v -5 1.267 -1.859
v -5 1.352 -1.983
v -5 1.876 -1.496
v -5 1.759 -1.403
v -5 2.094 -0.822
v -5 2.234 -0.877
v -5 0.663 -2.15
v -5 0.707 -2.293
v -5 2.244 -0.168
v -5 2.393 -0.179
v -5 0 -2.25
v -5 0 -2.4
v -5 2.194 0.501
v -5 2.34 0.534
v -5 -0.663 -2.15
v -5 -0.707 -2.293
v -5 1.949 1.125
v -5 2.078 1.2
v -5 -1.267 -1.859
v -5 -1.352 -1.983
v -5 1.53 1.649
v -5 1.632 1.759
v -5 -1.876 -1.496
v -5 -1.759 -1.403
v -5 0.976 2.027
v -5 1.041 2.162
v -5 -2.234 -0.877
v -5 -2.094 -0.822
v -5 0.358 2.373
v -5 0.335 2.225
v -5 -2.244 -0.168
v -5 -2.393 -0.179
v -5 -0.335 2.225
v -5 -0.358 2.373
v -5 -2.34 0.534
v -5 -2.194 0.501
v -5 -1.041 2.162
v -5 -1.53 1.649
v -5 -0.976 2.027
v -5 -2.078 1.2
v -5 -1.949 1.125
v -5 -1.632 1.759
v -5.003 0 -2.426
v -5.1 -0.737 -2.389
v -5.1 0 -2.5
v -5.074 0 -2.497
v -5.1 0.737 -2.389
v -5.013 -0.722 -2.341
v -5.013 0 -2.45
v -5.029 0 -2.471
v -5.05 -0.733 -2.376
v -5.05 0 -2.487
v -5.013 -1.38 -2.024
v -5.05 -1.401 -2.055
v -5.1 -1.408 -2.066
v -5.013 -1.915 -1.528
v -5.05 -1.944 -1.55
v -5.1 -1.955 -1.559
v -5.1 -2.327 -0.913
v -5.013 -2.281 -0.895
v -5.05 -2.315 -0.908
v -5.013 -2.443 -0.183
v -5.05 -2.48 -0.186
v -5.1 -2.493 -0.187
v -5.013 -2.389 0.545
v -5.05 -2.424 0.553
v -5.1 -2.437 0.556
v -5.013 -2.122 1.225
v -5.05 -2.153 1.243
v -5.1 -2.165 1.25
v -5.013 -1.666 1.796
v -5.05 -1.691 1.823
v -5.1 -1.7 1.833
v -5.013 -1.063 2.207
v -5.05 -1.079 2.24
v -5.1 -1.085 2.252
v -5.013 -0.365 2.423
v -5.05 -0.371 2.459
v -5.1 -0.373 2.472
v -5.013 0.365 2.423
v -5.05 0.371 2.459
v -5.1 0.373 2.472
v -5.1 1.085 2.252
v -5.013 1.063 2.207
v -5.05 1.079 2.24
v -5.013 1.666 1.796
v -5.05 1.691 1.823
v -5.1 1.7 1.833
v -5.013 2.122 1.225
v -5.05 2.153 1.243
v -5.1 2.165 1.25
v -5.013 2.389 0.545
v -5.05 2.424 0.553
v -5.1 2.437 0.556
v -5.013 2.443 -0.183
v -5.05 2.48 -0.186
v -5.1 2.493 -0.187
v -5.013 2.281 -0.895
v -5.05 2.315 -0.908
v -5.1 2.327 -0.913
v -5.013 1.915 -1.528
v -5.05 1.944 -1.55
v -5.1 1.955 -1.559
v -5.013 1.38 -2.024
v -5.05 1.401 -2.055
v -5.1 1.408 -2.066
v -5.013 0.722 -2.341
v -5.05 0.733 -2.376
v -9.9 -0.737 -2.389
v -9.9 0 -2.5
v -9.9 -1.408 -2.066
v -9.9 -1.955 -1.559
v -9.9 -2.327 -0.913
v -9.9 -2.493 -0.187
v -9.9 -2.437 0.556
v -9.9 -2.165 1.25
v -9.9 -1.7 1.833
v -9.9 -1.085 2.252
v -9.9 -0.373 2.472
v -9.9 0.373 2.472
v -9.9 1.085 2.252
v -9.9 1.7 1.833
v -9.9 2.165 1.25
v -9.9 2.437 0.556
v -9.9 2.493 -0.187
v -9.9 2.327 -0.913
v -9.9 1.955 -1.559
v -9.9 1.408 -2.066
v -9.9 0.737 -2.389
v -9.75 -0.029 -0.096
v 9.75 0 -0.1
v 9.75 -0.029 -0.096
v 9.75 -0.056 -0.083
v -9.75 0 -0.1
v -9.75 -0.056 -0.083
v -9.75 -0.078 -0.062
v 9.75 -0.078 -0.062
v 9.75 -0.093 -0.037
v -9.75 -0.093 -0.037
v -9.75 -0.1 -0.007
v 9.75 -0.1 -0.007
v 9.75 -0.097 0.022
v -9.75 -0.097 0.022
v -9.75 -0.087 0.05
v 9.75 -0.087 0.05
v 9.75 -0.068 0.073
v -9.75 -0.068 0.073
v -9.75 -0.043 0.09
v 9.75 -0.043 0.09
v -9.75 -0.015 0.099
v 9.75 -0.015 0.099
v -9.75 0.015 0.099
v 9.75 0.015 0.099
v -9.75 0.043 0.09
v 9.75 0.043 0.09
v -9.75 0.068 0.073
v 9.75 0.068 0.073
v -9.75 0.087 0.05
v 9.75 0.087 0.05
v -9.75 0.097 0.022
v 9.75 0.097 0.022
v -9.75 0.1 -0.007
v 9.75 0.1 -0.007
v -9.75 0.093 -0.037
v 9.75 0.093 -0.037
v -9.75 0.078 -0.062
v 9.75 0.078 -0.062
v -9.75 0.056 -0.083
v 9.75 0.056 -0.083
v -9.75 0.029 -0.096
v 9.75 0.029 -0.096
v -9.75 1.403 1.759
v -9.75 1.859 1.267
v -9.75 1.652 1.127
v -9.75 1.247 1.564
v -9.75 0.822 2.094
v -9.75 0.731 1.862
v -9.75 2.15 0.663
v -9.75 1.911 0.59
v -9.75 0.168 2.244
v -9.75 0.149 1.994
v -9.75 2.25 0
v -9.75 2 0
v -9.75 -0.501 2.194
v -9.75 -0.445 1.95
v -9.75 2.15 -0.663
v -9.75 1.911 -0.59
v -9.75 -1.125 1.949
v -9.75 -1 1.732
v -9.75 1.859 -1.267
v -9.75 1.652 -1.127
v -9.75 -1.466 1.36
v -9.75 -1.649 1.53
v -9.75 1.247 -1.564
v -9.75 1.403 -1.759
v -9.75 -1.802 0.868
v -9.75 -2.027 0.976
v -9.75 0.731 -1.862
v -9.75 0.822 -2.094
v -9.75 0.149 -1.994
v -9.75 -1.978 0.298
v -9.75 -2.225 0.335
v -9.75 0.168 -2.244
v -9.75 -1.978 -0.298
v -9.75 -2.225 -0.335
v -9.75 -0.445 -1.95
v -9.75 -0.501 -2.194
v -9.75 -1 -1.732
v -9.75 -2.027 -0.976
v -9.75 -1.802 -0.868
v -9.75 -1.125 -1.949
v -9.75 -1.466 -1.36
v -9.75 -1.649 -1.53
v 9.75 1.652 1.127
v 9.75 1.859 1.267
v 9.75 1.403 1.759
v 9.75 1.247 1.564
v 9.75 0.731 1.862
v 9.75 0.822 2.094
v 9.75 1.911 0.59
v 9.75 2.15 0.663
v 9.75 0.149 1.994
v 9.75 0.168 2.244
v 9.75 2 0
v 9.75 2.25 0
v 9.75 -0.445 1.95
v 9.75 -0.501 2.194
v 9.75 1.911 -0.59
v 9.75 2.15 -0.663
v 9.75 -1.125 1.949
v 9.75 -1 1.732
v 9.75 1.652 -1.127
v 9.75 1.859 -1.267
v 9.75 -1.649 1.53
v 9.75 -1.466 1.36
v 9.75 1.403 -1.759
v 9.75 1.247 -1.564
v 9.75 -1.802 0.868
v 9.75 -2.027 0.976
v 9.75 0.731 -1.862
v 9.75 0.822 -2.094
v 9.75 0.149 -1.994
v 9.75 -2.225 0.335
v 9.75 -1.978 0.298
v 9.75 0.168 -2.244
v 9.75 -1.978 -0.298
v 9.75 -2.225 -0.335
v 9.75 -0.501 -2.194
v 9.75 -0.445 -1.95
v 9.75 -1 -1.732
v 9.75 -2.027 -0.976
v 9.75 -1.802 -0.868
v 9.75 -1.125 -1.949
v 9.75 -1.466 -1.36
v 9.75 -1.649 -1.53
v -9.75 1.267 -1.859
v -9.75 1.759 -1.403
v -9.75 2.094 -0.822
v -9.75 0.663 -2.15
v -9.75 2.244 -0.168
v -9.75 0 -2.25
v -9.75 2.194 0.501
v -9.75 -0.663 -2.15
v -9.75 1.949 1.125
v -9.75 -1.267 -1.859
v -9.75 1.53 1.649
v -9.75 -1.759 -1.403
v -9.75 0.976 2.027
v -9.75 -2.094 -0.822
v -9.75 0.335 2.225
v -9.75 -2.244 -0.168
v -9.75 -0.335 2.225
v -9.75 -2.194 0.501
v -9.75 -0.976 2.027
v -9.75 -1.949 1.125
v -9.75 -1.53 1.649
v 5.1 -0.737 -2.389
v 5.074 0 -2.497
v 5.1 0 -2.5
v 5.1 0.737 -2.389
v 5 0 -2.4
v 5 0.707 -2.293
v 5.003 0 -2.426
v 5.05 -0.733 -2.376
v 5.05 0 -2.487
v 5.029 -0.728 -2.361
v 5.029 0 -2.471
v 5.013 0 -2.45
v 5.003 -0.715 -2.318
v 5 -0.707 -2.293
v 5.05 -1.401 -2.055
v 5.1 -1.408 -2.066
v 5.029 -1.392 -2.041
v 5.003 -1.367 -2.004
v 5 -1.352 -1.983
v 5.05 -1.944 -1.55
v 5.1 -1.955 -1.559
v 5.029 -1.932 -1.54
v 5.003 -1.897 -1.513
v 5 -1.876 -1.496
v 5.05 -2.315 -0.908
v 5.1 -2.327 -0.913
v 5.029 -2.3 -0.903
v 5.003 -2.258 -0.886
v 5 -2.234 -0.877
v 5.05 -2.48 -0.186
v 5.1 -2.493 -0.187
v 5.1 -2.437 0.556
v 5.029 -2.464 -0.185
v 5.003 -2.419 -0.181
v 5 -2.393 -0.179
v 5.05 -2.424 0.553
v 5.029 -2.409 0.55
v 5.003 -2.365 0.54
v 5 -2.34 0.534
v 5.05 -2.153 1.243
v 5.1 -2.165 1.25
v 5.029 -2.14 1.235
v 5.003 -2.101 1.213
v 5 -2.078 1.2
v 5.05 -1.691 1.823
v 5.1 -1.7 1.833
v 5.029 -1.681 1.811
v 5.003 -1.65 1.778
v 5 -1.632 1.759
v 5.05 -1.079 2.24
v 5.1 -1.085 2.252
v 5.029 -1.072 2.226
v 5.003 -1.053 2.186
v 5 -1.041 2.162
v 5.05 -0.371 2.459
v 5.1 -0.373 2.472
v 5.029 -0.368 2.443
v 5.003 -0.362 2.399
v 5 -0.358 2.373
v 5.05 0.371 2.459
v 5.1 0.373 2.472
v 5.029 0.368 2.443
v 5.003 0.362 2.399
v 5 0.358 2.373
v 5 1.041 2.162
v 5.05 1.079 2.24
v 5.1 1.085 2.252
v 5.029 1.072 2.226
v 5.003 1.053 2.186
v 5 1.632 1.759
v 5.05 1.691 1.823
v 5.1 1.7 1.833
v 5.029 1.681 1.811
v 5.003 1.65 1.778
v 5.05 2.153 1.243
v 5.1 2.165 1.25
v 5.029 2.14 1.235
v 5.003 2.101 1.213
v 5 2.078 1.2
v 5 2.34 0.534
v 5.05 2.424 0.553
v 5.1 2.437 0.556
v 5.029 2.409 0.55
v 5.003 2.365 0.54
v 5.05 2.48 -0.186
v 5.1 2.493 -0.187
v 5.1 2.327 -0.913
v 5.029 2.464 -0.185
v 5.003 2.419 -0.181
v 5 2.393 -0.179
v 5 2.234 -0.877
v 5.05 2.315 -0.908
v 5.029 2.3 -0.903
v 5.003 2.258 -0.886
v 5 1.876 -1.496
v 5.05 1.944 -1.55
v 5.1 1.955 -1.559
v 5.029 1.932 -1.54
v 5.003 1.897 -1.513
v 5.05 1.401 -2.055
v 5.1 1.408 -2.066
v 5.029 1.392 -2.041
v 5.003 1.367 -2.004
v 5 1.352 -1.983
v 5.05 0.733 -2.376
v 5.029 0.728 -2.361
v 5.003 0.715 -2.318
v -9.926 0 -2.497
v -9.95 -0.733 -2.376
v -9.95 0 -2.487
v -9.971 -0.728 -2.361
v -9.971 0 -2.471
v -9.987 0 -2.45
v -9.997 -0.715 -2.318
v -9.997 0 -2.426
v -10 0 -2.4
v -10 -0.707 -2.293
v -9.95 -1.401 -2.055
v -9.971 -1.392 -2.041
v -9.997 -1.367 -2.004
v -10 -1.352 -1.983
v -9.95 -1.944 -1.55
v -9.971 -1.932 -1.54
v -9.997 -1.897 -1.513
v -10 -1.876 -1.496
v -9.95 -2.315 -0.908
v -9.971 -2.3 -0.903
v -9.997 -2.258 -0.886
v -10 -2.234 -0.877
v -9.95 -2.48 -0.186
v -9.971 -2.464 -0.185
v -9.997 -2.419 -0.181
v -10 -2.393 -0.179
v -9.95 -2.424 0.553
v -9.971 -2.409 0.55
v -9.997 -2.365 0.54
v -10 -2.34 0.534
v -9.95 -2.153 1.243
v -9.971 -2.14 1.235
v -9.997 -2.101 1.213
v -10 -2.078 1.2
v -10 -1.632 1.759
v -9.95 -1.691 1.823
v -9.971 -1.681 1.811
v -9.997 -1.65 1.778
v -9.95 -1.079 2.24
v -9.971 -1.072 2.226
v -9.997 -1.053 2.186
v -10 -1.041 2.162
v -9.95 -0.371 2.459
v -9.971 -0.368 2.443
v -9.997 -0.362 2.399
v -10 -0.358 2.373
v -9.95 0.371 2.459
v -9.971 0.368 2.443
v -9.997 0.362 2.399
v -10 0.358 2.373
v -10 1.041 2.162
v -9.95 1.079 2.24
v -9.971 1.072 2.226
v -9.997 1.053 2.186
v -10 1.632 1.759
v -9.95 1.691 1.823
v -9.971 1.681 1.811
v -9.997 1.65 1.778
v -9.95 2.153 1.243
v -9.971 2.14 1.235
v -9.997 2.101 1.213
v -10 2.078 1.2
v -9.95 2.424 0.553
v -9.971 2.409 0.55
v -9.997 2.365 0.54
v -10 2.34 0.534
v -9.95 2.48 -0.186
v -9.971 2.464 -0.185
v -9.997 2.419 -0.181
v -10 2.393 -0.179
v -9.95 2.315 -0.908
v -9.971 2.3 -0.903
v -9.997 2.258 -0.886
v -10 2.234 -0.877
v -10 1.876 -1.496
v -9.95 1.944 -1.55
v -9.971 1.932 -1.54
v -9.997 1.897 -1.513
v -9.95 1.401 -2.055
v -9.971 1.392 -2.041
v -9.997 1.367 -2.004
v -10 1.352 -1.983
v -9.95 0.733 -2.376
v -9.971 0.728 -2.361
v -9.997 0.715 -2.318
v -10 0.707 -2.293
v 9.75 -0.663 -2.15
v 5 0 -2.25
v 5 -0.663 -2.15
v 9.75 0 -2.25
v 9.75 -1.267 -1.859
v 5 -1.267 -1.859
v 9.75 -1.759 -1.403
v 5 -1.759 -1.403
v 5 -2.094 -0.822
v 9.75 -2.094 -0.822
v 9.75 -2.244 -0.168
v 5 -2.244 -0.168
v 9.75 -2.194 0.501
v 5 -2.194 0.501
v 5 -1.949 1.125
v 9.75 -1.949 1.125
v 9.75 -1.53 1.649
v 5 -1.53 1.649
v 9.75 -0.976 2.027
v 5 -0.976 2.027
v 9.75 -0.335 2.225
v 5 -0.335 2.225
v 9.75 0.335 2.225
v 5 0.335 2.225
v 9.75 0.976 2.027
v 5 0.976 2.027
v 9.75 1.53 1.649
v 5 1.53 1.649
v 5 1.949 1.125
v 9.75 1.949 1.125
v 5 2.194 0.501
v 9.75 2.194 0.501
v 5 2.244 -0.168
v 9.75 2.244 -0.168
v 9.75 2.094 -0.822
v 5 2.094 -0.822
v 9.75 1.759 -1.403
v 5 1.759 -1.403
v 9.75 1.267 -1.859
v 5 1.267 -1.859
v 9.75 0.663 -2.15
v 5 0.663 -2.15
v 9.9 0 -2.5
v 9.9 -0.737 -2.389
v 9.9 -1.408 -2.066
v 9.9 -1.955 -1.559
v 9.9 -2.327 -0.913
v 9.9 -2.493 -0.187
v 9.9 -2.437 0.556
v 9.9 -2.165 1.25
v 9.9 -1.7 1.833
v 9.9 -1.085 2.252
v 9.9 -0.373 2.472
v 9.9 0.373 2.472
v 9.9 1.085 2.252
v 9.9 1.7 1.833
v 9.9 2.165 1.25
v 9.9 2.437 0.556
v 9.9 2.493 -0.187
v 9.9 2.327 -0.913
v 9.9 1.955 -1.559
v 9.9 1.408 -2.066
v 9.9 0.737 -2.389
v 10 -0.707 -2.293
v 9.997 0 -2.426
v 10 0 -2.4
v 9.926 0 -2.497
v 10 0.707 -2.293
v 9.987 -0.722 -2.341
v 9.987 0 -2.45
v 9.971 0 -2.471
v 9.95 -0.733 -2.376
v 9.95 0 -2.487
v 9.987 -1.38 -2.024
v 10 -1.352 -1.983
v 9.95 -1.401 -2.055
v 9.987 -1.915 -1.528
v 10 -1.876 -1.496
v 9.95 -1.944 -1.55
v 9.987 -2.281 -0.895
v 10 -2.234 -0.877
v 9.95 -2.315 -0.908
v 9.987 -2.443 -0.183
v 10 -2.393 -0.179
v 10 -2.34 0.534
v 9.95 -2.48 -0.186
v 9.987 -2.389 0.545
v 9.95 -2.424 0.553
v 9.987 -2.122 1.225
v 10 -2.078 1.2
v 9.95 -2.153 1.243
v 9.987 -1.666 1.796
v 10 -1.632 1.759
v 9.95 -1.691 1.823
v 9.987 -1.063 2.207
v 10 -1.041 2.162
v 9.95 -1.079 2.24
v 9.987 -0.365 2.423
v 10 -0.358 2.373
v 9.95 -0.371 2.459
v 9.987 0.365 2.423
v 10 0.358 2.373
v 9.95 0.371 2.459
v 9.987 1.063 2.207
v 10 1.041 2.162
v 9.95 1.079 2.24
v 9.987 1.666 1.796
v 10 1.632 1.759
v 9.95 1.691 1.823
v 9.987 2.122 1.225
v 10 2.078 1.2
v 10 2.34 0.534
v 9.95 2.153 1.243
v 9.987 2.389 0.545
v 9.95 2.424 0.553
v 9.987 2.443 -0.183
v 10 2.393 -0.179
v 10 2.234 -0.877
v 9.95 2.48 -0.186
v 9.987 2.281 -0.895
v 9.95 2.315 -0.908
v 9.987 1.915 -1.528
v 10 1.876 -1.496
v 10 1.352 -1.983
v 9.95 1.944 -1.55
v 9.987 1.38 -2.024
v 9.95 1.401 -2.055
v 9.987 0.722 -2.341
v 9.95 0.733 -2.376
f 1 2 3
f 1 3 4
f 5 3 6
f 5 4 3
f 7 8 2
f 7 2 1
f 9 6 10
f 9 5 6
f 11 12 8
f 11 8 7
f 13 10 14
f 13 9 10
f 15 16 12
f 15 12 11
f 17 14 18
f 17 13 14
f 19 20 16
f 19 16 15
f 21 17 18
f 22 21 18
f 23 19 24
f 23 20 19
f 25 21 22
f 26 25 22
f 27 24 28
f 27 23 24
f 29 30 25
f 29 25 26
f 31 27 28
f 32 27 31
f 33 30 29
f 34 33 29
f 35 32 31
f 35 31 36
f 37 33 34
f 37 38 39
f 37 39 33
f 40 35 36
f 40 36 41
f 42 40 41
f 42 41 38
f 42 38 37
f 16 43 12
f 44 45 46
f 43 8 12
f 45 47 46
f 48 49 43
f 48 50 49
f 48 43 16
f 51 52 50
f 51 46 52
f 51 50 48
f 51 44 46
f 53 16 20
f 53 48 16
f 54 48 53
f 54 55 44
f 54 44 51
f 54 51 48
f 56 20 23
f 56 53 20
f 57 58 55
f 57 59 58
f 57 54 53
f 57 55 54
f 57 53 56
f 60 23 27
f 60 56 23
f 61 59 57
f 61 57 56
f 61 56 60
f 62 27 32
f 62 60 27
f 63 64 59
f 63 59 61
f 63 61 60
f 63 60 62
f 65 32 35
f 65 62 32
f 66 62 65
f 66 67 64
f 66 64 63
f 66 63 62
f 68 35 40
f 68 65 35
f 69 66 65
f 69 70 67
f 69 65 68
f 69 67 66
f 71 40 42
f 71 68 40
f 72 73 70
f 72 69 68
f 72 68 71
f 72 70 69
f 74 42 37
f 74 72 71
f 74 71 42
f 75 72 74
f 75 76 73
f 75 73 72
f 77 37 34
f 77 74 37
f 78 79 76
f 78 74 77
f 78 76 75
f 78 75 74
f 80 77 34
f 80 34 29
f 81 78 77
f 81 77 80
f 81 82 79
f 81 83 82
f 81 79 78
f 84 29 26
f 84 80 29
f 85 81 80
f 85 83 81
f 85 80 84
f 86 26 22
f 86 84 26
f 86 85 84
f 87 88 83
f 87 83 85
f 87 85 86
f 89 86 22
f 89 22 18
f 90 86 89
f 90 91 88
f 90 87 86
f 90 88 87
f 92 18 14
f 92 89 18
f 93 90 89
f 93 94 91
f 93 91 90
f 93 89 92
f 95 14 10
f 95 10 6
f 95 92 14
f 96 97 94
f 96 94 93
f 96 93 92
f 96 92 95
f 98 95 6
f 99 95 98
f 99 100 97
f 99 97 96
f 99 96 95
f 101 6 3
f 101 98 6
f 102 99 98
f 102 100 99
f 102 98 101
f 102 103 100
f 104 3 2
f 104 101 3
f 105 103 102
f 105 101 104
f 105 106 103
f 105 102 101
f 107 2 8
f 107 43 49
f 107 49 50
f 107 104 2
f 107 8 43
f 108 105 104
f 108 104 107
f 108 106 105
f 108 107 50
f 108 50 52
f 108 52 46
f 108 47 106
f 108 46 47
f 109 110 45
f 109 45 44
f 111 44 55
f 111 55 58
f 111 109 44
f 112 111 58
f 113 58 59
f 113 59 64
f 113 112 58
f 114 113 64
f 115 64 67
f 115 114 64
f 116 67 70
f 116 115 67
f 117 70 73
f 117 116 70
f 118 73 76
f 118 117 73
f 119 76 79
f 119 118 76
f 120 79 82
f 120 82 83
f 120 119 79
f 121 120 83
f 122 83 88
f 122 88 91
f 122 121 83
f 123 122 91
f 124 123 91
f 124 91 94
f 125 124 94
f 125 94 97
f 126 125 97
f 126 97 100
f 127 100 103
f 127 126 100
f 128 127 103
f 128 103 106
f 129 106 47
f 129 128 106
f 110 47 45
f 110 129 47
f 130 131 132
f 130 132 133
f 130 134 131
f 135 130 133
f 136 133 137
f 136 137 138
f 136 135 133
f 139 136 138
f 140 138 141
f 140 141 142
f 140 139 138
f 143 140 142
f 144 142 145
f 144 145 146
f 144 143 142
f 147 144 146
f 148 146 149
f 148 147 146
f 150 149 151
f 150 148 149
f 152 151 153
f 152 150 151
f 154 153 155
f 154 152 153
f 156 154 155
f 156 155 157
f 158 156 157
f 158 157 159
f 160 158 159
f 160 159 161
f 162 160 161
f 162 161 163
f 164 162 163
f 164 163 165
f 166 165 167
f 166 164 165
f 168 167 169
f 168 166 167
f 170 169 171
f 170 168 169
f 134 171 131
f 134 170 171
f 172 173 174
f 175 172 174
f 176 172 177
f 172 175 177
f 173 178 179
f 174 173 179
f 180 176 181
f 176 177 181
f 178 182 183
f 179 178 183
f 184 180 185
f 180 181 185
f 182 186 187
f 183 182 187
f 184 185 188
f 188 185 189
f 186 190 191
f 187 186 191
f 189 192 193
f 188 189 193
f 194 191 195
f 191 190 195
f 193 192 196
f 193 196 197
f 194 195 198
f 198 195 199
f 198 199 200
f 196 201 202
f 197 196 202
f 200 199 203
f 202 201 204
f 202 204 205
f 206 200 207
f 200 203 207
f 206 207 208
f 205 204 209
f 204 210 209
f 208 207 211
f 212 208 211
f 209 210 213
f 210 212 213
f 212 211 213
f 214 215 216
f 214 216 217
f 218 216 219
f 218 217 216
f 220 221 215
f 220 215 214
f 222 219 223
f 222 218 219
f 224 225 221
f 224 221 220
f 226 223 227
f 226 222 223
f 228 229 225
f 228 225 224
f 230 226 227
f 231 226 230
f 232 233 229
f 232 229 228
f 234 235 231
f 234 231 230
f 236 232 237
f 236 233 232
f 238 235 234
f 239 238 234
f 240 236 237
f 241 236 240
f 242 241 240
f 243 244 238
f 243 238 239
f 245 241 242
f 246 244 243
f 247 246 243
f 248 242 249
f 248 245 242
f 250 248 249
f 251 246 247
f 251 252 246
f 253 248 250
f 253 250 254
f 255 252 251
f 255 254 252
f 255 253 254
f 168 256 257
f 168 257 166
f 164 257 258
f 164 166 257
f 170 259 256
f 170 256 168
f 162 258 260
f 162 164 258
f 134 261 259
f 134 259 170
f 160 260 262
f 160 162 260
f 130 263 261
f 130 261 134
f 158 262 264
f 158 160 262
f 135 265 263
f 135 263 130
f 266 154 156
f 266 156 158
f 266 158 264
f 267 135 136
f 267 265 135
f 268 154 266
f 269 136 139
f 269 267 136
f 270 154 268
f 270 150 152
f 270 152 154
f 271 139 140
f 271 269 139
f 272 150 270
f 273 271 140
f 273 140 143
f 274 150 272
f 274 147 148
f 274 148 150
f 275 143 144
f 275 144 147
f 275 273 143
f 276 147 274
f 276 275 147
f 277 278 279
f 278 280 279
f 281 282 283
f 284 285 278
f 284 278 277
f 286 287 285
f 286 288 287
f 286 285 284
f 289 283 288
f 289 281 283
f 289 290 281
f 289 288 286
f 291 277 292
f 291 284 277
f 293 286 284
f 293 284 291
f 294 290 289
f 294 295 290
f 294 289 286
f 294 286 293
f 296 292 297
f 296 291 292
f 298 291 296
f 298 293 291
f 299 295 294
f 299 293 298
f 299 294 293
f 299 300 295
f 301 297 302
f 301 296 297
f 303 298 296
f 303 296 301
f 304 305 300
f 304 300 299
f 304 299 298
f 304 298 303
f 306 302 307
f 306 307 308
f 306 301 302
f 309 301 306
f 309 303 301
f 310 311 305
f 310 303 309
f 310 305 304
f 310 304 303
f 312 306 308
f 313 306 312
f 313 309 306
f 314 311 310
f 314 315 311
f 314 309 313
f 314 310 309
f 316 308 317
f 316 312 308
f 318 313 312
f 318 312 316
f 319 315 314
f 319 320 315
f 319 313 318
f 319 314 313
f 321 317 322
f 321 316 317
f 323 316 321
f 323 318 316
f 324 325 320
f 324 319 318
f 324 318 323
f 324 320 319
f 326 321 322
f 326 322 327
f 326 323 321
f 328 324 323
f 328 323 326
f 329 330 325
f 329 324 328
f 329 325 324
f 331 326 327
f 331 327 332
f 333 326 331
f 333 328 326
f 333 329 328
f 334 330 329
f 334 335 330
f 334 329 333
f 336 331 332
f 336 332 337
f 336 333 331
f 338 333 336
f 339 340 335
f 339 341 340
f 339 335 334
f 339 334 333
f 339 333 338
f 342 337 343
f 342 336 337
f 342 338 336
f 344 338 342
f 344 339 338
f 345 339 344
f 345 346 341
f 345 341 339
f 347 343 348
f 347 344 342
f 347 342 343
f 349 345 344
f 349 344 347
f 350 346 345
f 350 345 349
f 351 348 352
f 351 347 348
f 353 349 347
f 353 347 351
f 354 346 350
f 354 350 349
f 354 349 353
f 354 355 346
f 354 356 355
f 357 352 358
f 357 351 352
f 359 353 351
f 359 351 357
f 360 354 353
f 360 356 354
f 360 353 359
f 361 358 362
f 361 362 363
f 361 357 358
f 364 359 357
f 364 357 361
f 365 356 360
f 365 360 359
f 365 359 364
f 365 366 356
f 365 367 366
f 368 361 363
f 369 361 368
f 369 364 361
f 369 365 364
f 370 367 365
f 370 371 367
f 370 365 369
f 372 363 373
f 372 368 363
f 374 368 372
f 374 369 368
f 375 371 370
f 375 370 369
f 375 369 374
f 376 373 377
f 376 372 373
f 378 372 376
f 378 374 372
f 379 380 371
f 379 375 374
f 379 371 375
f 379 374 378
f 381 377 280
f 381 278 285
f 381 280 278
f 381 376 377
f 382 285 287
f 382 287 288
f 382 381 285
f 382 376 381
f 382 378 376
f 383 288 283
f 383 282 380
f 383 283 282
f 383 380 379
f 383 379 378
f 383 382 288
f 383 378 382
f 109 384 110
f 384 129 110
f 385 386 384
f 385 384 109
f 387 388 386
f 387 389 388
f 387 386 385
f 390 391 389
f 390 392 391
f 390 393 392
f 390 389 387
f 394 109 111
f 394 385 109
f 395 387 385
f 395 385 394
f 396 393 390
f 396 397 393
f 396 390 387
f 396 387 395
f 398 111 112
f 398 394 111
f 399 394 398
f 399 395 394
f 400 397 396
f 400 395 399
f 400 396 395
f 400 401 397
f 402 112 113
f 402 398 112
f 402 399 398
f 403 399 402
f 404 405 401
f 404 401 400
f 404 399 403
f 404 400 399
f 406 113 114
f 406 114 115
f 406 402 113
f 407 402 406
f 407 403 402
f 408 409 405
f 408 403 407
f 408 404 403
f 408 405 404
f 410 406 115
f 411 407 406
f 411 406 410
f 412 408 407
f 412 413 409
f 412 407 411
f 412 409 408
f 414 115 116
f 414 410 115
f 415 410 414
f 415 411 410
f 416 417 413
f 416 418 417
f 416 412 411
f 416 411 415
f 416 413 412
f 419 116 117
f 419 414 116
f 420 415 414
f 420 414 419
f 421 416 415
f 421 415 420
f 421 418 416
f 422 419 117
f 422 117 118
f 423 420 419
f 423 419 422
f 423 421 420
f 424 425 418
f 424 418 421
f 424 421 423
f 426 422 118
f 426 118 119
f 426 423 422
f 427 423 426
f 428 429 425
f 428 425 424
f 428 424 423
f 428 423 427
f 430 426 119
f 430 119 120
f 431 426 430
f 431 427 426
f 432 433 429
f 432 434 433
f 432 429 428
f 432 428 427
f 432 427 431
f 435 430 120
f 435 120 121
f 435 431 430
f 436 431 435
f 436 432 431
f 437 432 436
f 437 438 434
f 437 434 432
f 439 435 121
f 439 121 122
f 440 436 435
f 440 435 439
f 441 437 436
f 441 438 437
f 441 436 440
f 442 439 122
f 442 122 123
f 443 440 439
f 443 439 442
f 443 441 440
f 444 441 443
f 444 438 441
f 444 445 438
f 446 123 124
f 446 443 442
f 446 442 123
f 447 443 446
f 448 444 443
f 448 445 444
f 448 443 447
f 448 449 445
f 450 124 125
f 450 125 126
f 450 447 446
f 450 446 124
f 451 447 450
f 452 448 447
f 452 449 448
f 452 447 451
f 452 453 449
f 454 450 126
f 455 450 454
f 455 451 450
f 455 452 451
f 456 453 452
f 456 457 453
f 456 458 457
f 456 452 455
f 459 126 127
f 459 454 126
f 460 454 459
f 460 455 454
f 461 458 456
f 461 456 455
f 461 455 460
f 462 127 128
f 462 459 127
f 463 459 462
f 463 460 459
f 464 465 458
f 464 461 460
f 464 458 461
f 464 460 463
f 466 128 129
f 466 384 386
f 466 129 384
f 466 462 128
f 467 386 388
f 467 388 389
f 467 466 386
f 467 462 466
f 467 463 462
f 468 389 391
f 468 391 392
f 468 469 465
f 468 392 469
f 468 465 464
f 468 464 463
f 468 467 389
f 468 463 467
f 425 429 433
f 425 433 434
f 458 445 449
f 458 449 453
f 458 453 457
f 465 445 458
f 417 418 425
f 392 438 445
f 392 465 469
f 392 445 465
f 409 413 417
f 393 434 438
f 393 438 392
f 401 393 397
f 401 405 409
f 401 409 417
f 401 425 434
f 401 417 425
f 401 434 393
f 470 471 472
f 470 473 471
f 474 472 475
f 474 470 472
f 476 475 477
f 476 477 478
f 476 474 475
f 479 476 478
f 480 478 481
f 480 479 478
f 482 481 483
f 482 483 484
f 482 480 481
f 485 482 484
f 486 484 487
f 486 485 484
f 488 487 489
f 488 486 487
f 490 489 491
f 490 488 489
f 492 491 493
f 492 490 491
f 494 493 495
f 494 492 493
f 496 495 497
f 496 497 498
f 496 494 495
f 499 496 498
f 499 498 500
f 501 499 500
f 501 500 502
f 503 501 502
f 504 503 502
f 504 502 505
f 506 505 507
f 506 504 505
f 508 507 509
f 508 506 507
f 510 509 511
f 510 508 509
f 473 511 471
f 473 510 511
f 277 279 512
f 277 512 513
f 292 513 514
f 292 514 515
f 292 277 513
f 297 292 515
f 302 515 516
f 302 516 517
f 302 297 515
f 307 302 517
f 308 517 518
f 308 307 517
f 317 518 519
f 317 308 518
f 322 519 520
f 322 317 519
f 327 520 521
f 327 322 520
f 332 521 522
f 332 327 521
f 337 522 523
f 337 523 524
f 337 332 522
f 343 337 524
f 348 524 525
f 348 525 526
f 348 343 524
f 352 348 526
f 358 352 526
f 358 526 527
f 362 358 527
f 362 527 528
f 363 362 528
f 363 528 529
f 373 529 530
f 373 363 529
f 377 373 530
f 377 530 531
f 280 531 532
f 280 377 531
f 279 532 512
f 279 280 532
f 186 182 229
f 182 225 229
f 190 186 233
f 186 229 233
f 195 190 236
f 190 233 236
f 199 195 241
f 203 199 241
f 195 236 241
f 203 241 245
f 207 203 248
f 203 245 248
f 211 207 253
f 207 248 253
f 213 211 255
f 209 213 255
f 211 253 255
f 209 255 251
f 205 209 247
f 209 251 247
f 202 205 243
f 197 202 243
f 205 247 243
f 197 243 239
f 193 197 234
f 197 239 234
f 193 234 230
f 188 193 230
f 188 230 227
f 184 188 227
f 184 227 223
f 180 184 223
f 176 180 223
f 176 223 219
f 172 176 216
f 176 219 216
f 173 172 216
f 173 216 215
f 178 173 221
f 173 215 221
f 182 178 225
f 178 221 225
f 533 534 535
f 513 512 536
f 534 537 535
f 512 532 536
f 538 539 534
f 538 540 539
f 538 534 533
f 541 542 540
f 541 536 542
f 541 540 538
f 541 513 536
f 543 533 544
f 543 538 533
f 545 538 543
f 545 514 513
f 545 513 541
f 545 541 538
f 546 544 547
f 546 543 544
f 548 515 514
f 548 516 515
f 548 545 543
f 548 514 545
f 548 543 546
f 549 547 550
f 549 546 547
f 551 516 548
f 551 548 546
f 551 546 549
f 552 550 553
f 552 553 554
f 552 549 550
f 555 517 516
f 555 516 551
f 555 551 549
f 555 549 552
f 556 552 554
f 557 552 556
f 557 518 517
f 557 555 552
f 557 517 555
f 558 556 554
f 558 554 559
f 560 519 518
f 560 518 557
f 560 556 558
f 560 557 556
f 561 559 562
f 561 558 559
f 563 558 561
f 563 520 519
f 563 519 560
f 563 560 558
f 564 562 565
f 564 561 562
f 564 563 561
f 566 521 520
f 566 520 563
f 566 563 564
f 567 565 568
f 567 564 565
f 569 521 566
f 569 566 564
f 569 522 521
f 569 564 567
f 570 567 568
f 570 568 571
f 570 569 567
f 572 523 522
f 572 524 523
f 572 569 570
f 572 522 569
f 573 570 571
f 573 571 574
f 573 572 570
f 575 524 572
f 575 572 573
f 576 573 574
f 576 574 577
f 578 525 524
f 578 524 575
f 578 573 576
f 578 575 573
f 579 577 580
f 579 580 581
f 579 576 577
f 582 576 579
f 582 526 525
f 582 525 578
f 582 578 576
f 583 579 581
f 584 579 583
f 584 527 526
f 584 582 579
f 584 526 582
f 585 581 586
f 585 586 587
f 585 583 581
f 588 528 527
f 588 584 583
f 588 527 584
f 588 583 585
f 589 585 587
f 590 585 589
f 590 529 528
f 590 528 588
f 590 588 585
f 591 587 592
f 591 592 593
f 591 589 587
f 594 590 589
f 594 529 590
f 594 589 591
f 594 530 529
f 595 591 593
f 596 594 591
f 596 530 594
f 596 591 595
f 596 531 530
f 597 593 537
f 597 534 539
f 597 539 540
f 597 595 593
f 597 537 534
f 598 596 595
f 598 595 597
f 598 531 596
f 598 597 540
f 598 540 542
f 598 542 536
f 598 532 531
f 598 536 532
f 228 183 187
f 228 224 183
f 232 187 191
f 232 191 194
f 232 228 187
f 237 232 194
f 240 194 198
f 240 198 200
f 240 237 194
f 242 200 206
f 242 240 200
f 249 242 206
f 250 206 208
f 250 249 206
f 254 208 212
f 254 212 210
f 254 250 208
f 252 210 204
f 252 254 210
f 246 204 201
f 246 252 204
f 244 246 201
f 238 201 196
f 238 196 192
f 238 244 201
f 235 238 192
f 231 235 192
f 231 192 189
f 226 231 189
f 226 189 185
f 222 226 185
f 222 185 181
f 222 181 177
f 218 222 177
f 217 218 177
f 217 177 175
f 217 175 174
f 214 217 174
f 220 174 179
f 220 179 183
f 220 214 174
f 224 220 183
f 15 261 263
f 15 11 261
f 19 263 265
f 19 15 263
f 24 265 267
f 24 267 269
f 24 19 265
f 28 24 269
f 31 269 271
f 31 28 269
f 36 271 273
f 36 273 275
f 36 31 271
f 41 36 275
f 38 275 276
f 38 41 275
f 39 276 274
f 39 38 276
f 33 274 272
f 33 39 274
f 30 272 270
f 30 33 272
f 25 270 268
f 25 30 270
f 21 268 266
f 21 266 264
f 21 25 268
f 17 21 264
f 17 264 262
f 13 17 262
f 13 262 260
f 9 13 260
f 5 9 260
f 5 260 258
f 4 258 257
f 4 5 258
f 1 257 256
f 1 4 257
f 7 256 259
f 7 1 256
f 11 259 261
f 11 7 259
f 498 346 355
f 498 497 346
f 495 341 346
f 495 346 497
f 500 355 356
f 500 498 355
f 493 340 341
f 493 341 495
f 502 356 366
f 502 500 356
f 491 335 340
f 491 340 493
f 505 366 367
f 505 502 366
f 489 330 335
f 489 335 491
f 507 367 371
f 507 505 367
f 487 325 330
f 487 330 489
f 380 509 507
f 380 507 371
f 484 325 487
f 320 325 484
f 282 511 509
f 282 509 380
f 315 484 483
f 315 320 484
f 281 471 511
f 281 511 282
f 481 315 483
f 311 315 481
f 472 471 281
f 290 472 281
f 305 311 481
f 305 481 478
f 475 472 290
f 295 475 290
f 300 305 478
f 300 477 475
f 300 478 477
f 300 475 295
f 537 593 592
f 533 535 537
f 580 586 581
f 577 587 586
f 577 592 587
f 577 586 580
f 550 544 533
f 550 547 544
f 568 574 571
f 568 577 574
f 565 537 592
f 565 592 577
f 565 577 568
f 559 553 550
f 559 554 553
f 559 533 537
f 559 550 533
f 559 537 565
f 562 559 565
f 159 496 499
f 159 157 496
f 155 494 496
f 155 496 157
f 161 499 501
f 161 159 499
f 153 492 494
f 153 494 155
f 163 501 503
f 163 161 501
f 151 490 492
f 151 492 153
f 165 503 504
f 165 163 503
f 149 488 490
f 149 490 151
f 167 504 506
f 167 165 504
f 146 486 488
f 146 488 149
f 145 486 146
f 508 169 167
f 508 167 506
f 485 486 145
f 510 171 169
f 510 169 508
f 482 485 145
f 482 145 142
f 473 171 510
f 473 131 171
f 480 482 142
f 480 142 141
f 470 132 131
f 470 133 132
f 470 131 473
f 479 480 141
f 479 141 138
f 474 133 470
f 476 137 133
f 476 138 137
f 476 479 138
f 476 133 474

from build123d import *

# Parameters (mm, degrees)
SCHIZZO4_W  = 19.5
SCHIZZO4_H  = 0.25
RACCORDO1_R = 0.1


with BuildPart() as part:
    # Schizzo4 → Rivoluzione3 (revolve)
    with BuildSketch(Plane.XY):
        with Locations((0, 2.125)):
            Rectangle(SCHIZZO4_W, SCHIZZO4_H)
    revolve(axis=Axis((0, 0, 0), (-1, 0, 0)))


with BuildPart() as body_2:
    # Schizzo6 → Rivoluzione4 (revolve)
    with BuildSketch(Plane.XY, mode=Mode.PRIVATE) as rivoluzione4_sk:
        Polygon((-9.75, 0), (0, 0), (0, 0.1), (-9.75, 0.1), (-9.75, 2.25), (-5, 2.25), (-5, 2.5), (-10, 2.5), (-10, 0), align=None)
        Polygon((0, 0), (9.75, 0), (10, 0), (10, 2.5), (5, 2.5), (5, 2.25), (9.75, 2.25), (9.75, 0.1), (0, 0.1), align=None)
    revolve(rivoluzione4_sk.sketch.rotate(Axis((9.75, 0, 0), (-1, 0, 0)), 90), axis=Axis((9.75, 0, 0), (-1, 0, 0)))

    # Raccordo1
    raccordo1_edges = [body_2.edges().sort_by_distance(p)[0] for p in [
        (-10, 0, 2.5),
        (-5, 0, 2.5),
        (5, 0, 2.5),
        (10, 0, 2.5),
    ]]
    fillet(raccordo1_edges, radius=RACCORDO1_R)


solid = Compound([part.part, body_2.part])
